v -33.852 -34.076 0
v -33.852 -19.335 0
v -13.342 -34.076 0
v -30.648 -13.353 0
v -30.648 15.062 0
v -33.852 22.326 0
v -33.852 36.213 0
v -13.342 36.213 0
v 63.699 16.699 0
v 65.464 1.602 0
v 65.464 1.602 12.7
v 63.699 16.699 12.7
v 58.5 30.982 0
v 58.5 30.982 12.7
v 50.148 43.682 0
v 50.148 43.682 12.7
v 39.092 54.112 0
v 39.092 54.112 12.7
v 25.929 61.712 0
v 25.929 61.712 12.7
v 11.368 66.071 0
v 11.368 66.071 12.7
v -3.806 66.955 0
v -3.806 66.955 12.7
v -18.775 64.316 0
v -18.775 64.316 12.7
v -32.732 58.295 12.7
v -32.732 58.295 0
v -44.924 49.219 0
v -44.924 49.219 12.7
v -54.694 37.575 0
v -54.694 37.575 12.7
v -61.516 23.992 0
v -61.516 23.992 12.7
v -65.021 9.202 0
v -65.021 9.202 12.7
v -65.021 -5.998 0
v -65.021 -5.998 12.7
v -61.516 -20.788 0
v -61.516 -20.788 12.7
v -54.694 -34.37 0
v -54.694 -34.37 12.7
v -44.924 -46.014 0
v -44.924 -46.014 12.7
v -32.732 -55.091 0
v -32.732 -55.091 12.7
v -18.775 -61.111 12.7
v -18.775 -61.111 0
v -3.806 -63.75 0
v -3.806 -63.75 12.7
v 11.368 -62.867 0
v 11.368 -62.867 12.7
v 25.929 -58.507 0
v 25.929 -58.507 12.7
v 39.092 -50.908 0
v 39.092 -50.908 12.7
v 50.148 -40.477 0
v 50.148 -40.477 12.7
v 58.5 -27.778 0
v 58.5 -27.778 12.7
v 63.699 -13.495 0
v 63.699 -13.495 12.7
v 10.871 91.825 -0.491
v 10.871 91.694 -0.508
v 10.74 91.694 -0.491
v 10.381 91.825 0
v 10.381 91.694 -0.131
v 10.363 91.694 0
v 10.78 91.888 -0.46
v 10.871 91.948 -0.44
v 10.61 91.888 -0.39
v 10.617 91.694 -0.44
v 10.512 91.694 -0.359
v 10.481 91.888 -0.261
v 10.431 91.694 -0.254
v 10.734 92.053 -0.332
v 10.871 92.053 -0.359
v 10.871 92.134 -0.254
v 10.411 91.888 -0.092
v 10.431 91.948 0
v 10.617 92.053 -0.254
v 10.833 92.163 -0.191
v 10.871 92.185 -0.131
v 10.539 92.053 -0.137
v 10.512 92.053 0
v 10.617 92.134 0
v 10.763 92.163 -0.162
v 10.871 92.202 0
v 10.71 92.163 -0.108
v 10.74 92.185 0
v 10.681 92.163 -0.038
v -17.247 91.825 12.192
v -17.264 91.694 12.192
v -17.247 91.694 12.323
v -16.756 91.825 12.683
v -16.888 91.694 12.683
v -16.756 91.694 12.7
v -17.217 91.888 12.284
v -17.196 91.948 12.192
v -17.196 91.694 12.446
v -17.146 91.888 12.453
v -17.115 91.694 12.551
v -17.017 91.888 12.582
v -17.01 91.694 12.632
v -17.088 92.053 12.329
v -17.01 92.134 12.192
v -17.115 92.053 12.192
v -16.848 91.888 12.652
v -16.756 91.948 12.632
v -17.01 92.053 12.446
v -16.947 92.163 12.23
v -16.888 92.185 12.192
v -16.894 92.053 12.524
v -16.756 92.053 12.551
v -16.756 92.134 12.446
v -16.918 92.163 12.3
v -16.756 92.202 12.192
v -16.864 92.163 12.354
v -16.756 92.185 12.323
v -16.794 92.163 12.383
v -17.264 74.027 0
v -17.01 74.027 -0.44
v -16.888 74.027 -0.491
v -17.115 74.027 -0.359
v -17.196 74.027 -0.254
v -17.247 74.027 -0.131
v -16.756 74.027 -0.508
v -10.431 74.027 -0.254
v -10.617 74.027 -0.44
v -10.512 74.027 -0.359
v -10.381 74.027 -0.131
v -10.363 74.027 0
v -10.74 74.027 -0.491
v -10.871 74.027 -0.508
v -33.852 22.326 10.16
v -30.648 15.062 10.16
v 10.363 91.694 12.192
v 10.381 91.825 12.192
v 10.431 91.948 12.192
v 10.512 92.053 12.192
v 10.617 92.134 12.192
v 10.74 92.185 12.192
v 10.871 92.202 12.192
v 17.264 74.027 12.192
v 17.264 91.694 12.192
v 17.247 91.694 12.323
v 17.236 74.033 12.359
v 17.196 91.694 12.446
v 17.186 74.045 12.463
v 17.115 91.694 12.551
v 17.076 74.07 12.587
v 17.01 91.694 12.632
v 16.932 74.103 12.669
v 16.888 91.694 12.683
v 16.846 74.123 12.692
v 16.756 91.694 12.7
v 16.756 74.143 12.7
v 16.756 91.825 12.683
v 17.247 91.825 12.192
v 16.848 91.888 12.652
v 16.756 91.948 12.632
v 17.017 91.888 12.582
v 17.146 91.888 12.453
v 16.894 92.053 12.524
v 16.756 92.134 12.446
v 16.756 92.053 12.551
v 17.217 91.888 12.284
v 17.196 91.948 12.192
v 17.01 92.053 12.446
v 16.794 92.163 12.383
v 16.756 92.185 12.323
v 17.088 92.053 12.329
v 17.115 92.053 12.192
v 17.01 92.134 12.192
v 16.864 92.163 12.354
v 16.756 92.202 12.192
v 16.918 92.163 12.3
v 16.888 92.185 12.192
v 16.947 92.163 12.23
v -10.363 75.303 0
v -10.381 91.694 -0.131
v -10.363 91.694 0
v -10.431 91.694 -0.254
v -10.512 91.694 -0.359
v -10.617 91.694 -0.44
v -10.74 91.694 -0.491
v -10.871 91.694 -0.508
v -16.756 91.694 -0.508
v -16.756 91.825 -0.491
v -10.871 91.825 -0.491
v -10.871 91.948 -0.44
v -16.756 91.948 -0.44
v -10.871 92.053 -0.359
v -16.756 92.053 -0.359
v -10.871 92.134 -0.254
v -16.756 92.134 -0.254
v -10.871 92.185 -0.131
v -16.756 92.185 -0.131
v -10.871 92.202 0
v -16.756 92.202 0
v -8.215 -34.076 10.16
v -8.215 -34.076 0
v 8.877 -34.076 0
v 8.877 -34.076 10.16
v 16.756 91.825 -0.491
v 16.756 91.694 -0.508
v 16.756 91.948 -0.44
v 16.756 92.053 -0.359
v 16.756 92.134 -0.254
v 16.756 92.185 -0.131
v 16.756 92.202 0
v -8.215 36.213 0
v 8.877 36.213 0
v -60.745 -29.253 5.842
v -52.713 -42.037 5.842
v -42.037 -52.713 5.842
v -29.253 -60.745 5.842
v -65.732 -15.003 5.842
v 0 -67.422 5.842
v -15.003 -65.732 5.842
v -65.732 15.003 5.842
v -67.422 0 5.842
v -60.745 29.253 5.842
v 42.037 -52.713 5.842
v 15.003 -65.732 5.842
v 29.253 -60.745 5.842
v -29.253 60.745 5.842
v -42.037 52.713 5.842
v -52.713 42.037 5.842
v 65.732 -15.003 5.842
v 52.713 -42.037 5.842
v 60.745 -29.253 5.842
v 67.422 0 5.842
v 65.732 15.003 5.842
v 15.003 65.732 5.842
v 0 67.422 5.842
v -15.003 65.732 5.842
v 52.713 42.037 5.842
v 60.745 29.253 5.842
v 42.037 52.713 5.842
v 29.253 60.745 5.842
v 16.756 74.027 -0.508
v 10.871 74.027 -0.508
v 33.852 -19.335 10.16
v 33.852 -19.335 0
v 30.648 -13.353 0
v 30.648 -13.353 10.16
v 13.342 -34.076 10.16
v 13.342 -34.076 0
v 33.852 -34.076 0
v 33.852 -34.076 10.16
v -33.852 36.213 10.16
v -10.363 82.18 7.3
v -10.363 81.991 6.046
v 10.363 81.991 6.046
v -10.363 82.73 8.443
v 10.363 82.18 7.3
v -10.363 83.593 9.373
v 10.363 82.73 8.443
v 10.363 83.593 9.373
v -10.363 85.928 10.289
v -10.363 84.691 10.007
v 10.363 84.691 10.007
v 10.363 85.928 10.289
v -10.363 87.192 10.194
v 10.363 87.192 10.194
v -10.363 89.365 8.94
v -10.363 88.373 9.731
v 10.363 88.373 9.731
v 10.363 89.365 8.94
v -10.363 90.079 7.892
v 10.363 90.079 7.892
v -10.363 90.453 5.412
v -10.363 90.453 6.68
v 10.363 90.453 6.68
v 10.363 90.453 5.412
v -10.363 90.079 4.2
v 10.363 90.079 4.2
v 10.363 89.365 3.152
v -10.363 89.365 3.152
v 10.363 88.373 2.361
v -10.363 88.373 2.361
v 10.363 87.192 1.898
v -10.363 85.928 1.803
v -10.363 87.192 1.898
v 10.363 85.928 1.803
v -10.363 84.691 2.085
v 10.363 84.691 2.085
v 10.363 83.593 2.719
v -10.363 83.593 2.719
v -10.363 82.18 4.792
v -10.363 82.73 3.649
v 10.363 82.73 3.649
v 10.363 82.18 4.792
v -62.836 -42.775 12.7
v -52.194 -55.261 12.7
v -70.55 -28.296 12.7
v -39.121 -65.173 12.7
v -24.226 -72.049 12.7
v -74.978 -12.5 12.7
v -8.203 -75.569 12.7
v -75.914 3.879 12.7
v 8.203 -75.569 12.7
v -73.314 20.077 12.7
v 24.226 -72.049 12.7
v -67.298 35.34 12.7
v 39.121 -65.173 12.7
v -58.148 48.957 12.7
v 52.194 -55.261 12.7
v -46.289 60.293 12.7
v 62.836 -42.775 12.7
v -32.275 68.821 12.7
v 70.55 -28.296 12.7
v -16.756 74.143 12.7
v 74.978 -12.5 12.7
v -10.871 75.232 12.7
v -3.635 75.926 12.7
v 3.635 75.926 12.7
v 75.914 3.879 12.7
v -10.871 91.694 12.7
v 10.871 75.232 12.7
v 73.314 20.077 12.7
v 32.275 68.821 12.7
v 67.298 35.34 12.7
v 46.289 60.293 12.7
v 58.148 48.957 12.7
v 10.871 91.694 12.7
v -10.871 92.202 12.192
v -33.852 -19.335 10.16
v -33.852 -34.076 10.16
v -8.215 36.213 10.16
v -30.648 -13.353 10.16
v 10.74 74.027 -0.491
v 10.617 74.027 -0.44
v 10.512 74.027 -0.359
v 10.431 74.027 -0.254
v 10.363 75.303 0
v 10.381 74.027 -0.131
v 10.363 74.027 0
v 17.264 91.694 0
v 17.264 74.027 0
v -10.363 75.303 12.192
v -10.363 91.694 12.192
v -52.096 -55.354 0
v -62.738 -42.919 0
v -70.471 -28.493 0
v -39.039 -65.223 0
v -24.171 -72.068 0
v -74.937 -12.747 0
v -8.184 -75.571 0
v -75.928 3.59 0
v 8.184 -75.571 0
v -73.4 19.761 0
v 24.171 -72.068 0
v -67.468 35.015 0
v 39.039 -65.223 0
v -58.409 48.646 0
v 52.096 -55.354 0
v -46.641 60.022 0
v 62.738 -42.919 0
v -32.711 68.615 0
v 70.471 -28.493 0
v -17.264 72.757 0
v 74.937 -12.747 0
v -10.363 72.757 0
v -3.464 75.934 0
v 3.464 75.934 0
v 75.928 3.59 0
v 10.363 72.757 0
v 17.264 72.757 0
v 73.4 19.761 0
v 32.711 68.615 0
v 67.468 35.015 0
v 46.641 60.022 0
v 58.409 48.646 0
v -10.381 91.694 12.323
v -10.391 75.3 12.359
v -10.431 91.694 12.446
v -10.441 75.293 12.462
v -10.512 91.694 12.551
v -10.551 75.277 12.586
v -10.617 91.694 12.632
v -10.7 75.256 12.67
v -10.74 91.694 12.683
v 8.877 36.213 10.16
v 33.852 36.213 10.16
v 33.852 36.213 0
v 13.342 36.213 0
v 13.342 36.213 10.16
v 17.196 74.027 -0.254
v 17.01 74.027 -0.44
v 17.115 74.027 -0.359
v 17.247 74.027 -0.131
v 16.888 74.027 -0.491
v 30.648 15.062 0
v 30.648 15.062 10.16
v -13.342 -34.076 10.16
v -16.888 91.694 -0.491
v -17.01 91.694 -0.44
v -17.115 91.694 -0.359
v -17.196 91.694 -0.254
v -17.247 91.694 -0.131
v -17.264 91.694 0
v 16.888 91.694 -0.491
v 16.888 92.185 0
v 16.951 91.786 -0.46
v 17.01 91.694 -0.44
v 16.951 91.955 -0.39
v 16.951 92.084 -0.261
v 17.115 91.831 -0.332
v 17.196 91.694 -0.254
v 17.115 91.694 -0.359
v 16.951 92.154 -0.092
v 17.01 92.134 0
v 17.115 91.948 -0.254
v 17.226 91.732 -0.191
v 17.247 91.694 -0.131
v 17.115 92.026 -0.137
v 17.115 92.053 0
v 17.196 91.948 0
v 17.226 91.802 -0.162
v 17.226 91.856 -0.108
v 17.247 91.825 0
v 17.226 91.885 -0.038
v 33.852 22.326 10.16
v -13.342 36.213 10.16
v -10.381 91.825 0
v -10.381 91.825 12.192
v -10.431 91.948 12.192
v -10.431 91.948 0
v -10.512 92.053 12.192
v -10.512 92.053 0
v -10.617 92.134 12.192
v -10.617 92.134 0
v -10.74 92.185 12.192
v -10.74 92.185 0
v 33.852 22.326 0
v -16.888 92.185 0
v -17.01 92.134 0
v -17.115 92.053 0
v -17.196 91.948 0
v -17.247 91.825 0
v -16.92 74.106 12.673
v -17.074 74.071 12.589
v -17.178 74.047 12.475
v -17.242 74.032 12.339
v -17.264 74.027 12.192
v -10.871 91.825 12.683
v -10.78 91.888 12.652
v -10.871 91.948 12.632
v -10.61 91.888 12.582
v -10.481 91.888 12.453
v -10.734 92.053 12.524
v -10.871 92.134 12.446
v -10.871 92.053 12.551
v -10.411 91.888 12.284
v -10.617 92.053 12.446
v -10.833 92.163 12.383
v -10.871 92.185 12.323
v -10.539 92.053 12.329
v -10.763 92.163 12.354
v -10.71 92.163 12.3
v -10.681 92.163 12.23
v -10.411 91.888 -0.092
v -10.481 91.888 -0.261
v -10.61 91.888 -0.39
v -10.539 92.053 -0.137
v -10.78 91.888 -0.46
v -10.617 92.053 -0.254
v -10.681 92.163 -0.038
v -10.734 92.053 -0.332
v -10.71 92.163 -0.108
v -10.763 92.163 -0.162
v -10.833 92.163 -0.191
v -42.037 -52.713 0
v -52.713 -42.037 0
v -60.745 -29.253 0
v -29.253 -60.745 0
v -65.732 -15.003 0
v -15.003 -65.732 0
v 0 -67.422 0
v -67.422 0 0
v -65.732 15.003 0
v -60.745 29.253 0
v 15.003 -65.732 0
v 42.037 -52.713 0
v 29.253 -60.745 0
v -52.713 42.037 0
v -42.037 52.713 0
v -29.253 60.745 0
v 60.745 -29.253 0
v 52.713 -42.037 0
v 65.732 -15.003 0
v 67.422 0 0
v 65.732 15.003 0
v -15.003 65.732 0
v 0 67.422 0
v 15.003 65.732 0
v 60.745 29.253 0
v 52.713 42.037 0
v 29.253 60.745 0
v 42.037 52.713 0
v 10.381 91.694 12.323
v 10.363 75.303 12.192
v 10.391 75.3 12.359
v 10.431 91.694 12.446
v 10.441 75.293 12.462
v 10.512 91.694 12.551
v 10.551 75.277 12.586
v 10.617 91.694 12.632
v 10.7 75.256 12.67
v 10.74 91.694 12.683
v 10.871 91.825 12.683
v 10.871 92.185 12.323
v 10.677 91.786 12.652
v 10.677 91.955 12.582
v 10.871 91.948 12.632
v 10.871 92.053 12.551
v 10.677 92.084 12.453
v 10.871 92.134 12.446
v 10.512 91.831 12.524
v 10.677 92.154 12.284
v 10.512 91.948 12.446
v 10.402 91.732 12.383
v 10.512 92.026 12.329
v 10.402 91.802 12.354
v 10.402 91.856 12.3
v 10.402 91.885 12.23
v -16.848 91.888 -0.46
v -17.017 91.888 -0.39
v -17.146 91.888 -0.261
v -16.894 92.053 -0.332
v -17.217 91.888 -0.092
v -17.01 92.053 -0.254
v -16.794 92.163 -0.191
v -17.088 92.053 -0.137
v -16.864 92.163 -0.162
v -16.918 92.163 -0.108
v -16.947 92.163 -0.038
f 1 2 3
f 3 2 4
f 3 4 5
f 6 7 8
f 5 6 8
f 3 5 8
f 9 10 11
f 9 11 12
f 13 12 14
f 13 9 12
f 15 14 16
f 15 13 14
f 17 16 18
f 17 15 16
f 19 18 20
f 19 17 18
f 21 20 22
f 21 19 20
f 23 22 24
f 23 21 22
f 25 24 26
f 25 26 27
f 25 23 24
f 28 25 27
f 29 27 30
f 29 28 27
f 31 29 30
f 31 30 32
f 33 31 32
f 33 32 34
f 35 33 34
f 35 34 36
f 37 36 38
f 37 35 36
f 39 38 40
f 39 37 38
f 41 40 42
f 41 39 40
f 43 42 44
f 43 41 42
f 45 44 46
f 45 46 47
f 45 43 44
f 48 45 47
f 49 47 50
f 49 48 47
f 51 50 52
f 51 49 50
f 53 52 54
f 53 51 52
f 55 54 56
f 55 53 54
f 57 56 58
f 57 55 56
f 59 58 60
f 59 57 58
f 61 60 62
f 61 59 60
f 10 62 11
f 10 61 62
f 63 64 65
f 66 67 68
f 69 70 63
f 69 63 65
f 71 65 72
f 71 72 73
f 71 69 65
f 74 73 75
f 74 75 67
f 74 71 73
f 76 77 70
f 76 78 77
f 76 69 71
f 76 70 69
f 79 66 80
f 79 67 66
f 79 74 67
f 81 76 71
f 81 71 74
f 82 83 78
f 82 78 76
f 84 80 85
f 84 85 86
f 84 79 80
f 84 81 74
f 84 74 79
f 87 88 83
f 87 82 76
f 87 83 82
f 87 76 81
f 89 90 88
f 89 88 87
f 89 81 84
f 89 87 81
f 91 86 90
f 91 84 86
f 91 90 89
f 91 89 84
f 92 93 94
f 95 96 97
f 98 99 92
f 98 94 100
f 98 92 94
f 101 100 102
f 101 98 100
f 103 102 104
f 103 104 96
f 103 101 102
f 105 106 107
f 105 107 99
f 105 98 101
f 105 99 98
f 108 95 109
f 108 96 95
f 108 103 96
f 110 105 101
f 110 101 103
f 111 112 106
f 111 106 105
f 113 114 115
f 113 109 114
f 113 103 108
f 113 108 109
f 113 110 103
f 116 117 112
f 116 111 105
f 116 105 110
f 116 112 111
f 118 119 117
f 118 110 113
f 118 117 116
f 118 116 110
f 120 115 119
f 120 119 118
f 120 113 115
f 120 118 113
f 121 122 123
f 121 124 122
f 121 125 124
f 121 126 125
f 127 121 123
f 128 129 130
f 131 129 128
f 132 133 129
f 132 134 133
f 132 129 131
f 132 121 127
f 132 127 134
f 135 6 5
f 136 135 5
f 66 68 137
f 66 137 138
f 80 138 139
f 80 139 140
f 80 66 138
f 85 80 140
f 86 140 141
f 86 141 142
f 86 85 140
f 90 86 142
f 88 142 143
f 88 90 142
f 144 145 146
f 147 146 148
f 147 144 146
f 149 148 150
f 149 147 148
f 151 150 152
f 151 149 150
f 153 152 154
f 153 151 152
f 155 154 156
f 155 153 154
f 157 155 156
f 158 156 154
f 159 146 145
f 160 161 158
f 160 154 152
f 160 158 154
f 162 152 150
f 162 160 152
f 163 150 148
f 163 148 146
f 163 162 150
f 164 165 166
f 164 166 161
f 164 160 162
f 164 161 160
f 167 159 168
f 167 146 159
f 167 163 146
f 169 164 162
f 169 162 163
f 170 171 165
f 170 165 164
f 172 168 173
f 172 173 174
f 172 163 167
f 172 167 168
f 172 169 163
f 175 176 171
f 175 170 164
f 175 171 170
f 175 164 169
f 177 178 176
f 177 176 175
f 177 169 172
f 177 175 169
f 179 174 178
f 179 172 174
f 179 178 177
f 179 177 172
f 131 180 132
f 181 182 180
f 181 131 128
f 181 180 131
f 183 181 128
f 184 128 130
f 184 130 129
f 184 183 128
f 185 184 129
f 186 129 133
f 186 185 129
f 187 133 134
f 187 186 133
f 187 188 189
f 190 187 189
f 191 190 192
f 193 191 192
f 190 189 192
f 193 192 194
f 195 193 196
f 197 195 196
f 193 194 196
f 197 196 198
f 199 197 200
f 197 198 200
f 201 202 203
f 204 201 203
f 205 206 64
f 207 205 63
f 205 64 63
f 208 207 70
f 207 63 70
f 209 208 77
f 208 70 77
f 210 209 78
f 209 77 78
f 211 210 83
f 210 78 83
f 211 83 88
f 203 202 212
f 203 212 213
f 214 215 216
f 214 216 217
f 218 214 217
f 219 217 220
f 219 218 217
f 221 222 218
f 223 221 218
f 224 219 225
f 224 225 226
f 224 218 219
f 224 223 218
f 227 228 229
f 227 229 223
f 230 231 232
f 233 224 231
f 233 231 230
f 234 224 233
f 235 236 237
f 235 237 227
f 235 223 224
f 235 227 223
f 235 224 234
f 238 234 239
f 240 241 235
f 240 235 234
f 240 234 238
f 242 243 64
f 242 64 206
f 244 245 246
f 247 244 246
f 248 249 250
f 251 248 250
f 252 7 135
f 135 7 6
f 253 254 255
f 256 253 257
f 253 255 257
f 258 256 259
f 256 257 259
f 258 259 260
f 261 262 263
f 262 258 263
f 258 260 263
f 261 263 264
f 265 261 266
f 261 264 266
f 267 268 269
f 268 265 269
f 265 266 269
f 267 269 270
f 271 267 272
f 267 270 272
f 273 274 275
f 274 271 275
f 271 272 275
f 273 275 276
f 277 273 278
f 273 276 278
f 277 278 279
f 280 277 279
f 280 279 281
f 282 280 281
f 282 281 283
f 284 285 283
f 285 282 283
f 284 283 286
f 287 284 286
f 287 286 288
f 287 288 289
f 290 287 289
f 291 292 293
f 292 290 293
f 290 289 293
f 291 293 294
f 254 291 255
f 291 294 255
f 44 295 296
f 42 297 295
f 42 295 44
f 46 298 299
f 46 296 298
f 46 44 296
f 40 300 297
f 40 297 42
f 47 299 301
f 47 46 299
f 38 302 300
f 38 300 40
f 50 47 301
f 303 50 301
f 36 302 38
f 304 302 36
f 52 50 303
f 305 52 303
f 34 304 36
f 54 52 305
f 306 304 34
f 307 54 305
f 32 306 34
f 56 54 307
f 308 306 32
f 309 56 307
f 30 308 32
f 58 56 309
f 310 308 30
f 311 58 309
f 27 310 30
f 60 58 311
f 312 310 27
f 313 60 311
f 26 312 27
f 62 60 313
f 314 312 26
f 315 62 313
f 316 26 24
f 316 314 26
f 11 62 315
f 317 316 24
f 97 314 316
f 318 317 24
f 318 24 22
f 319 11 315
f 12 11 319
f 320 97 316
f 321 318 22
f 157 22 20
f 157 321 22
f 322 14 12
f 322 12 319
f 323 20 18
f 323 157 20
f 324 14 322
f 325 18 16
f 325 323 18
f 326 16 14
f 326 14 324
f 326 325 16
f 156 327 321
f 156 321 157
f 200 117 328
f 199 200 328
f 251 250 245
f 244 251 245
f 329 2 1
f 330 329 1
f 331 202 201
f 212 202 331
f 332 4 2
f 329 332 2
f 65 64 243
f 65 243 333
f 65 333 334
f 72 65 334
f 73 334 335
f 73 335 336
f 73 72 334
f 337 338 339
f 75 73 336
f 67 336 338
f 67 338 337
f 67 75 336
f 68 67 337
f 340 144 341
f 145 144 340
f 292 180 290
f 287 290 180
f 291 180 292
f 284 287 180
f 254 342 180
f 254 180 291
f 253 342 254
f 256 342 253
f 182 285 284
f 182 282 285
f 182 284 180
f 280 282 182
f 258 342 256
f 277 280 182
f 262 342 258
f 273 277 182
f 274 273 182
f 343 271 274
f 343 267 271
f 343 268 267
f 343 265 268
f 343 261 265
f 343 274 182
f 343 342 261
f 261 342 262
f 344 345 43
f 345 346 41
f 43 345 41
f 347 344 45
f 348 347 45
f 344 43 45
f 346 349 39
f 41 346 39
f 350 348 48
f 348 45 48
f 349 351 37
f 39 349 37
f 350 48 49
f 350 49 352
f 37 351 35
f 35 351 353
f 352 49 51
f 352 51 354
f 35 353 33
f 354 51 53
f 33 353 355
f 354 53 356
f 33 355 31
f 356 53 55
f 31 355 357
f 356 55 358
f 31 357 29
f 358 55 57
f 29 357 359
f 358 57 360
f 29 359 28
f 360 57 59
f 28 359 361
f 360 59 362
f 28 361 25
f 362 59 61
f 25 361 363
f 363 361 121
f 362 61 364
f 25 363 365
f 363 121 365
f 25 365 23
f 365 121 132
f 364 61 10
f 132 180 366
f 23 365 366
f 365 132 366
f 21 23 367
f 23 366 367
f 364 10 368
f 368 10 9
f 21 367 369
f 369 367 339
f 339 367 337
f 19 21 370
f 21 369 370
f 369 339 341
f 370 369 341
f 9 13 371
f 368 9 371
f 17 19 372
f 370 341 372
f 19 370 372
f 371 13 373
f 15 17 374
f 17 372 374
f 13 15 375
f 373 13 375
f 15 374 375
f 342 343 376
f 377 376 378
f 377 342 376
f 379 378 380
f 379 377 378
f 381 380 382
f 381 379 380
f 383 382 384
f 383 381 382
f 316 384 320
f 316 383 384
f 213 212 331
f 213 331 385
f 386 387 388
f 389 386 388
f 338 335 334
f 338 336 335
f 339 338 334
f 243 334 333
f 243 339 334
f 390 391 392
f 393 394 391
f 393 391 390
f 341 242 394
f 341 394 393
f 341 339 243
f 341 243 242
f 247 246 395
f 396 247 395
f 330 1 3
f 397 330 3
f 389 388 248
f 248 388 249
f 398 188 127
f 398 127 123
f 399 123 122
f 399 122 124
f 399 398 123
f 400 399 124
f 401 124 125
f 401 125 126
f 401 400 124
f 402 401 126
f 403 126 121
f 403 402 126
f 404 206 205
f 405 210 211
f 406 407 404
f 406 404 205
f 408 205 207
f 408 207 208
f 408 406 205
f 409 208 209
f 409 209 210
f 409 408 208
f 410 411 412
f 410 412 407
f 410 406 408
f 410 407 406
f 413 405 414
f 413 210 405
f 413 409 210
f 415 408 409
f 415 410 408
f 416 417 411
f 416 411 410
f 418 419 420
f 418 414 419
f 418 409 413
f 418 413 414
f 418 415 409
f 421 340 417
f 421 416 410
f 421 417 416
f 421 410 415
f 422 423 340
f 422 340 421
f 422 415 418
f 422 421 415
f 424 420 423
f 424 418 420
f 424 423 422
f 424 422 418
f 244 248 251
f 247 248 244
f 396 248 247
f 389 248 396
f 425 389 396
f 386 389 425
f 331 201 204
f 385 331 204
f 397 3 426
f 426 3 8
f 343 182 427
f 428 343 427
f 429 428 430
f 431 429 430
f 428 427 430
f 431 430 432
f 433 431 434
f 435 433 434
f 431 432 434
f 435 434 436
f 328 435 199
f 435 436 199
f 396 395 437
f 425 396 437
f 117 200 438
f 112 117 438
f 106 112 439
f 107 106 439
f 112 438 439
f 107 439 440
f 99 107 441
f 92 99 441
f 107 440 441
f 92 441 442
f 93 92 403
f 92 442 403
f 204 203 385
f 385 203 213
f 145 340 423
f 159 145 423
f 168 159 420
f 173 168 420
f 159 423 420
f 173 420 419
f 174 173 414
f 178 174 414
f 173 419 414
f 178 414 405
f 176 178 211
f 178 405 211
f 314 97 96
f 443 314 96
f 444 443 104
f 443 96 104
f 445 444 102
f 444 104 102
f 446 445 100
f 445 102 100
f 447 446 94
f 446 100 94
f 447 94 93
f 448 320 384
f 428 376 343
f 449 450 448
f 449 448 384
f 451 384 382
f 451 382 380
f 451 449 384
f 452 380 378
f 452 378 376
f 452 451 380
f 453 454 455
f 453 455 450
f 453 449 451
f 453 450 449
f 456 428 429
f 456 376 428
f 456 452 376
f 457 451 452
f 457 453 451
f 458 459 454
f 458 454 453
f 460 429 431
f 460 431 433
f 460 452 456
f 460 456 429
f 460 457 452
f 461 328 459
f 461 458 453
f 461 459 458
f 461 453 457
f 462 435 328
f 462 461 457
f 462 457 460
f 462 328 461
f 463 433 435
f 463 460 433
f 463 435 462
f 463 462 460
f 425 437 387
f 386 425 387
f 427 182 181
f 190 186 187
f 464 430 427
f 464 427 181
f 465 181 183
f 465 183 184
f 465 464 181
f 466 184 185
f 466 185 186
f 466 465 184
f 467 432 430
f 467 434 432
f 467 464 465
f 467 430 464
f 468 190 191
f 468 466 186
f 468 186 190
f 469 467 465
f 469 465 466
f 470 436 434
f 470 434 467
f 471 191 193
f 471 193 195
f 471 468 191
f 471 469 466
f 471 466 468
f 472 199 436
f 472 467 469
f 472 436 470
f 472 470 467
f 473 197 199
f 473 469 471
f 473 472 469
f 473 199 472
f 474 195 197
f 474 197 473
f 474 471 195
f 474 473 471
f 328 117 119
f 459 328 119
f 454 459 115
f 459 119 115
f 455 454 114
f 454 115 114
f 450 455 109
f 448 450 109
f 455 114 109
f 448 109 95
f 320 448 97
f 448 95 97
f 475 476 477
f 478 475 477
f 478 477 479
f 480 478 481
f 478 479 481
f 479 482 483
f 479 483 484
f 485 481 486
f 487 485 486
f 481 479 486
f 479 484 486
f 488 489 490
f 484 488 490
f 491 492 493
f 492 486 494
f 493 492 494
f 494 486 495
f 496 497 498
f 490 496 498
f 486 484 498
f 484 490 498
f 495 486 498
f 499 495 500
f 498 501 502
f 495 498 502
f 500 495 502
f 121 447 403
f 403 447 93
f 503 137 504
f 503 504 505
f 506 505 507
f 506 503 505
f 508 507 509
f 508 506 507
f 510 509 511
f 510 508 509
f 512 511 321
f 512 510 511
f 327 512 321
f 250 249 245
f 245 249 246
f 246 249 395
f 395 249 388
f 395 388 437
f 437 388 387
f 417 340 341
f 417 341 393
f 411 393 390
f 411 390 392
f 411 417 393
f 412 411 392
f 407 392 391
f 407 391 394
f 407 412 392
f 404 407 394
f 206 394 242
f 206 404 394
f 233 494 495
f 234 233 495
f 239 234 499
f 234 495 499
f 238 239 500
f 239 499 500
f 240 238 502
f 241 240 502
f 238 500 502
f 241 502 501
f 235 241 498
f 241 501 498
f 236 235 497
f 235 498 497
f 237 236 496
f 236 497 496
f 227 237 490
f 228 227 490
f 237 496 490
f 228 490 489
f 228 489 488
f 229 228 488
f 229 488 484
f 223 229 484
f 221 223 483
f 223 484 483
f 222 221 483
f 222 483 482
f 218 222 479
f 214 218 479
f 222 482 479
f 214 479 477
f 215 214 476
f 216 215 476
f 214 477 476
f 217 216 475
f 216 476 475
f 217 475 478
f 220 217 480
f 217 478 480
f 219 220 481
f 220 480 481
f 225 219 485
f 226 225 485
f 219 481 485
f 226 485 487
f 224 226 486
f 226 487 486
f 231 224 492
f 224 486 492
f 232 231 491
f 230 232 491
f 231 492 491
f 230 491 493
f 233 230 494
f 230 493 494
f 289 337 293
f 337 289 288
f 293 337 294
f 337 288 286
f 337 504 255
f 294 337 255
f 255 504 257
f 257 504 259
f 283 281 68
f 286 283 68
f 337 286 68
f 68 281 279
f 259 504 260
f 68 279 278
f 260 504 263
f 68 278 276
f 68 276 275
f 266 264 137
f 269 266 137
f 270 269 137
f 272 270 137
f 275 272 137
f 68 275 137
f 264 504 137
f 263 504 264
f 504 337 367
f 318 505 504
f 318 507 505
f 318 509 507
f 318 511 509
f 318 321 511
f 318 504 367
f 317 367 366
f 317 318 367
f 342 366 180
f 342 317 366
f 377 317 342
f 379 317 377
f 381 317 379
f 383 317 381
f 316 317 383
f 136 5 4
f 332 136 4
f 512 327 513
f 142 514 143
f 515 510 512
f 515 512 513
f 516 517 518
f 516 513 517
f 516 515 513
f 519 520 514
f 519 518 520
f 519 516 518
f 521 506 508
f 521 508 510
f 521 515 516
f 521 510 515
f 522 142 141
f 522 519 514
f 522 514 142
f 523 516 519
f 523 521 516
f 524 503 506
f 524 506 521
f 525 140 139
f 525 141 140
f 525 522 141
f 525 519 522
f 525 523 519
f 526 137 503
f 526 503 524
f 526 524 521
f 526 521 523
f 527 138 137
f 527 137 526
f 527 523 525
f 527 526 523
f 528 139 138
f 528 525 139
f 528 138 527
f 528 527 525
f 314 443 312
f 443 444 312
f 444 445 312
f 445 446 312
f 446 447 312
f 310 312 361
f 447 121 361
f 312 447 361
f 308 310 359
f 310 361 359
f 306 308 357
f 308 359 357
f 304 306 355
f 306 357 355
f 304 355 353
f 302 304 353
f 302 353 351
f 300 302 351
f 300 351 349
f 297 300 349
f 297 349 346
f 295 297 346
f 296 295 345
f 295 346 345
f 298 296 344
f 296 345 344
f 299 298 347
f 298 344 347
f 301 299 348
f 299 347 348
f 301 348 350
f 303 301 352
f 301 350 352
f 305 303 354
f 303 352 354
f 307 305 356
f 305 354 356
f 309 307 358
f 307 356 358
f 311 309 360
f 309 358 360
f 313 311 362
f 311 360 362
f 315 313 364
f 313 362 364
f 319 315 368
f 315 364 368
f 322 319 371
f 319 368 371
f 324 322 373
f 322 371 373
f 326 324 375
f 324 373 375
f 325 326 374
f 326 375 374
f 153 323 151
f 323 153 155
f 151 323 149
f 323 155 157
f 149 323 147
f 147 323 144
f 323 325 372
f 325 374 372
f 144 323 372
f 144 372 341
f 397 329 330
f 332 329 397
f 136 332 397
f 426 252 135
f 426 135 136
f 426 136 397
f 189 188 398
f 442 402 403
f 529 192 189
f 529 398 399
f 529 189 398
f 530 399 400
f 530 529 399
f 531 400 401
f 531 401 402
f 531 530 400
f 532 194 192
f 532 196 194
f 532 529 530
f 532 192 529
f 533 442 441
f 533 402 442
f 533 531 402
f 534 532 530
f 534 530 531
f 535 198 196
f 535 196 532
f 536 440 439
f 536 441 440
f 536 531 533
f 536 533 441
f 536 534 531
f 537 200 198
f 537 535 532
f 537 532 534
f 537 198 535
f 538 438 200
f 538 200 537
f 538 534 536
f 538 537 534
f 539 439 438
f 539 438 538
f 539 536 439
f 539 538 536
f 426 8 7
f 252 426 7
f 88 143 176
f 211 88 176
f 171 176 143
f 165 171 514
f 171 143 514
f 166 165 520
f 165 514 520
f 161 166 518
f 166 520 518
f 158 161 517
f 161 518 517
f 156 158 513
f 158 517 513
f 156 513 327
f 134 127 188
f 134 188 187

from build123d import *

# Parameters (mm, degrees)
F0_R         = 76.0132265617
F0_R_2       = 65.4635898971
F1_DEPTH     = 12.7
F2_DEPTH     = 10.16
F0_W         = 17.0915899798
F0_H         = 70.289157331
F3_R         = 67.422384844
F4_DEPTH     = 5.842
F5_W         = 6.9010015448
F5_H         = 18.1752619196
F6_DEPTH     = 13.208
F7_T1_DEPTH  = 5.8850015448
F7_T3_DEPTH  = 5.8850015448
F7_T5_DEPTH  = 12.192
F7_T7_DEPTH  = 18.9372619196
F7_S11_W     = 0.508
F7_S11_H     = 0.508
F7_T12_DEPTH = 0.508
F7_S17_W     = 0.508
F7_S17_H     = 0.508
F7_T18_DEPTH = 0.508
F7_S23_W     = 0.508
F7_S23_H     = 0.508
F7_T24_DEPTH = 0.508
F7_S29_W     = 0.508
F7_S29_H     = 0.508
F7_T30_DEPTH = 0.508
F7_S35_W     = 0.508
F7_S35_H     = 0.508
F7_T36_DEPTH = 0.508
F7_S41_W     = 0.508
F7_S41_H     = 0.508
F7_T42_DEPTH = 0.508
F7_S47_W     = 0.508
F7_S47_H     = 0.508
F7_T48_DEPTH = 0.508
F7_S53_W     = 0.508
F7_S53_H     = 0.508
F7_T54_DEPTH = 0.508
F7_T60_DEPTH = 17.6605161867
F7_S61_R     = 76.0132265617
F7_T62_DEPTH = 10
F7_T66_DEPTH = 18.9372619196
F7_S67_R     = 76.0132265617
F7_T68_DEPTH = 11
F7_T72_DEPTH = 17.6605161867
F7_S73_R     = 76.0132265617
F7_T74_DEPTH = 10
F7_T78_DEPTH = 18.9372619196
F7_S79_R     = 76.0132265617
F7_T80_DEPTH = 11
F8_R         = 4.2547927507
F9_DEPTH     = 25.4


# Not quite as in the source:
# - a fillet or chamfer that OpenCascade refuses, or shapes differently, is made with other operations: its cross-section is extruded or revolved along the edge and cut away or added


with BuildPart() as f1:
    # F0 (on Top) → F1 (new body)
    with BuildSketch(Plane.XY):
        Circle(F0_R)
        with Locations((0, 1.6023365315)):
            Circle(F0_R_2, mode=Mode.SUBTRACT)
    extrude(amount=F1_DEPTH)

    # F5 (on face) → F6 (join)
    with BuildSketch(Plane.XY.offset(12.7)):
        with Locations((-13.8136995892, 83.1143693602)):
            Rectangle(F5_W, F5_H)
        with Locations((13.8136995892, 83.1143693602)):
            Rectangle(F5_W, F5_H)
    extrude(amount=-F6_DEPTH)

    # F7: fillet of radius 0.508 on 16 edges, made by hand

    # F7_s2 → F7_t1 (cut)
    with BuildSketch(Plane.YZ.offset(-16.7562003616)):
        with BuildLine():
            ThreePointArc((92.20200032, 12.192), (92.0532105648, 12.5512102448), (91.69400032, 12.7))
            Line((91.69400032, 12.7), (92.20200032, 12.7))
            Line((92.20200032, 12.7), (92.20200032, 12.192))
        make_face()
        with BuildLine():
            ThreePointArc((91.69400032, -0.508), (92.0532105648, -0.3592102448), (92.20200032, 0))
            Line((92.20200032, 0), (92.20200032, -0.508))
            Line((92.20200032, -0.508), (91.69400032, -0.508))
        make_face()
    extrude(amount=F7_T1_DEPTH, mode=Mode.SUBTRACT)

    # F7_s4 → F7_t3 (cut)
    with BuildSketch(Plane.YZ.offset(10.8711988168)):
        with BuildLine():
            ThreePointArc((92.20200032, 12.192), (92.0532105648, 12.5512102448), (91.69400032, 12.7))
            Line((91.69400032, 12.7), (92.20200032, 12.7))
            Line((92.20200032, 12.7), (92.20200032, 12.192))
        make_face()
        with BuildLine():
            ThreePointArc((91.69400032, -0.508), (92.0532105648, -0.3592102448), (92.20200032, 0))
            Line((92.20200032, 0), (92.20200032, -0.508))
            Line((92.20200032, -0.508), (91.69400032, -0.508))
        make_face()
    extrude(amount=F7_T3_DEPTH, mode=Mode.SUBTRACT)

    # F7_s6 → F7_t5 (cut)
    with BuildSketch(Plane.XY):
        with BuildLine():
            ThreePointArc((17.2642003616, 91.69400032), (17.1154106065, 92.0532105648), (16.7562003616, 92.20200032))
            Line((16.7562003616, 92.20200032), (17.2642003616, 92.20200032))
            Line((17.2642003616, 92.20200032), (17.2642003616, 91.69400032))
        make_face()
        with BuildLine():
            ThreePointArc((10.3631988168, 91.69400032), (10.5119885719, 92.0532105648), (10.8711988168, 92.20200032))
            Line((10.8711988168, 92.20200032), (10.3631988168, 92.20200032))
            Line((10.3631988168, 92.20200032), (10.3631988168, 91.69400032))
        make_face()
        with BuildLine():
            ThreePointArc((-16.7562003616, 92.20200032), (-17.1154106065, 92.0532105648), (-17.2642003616, 91.69400032))
            Line((-17.2642003616, 91.69400032), (-17.2642003616, 92.20200032))
            Line((-17.2642003616, 92.20200032), (-16.7562003616, 92.20200032))
        make_face()
        with BuildLine():
            ThreePointArc((-10.3631988168, 91.69400032), (-10.5119885719, 92.0532105648), (-10.8711988168, 92.20200032))
            Line((-10.8711988168, 92.20200032), (-10.3631988168, 92.20200032))
            Line((-10.3631988168, 92.20200032), (-10.3631988168, 91.69400032))
        make_face()
    extrude(amount=F7_T5_DEPTH, mode=Mode.SUBTRACT)

    # F7_s8 → F7_t7 (cut)
    with BuildSketch(Plane.XZ.offset(-91.69400032)):
        with BuildLine():
            ThreePointArc((10.8711988168, -0.508), (10.5119885719, -0.3592102448), (10.3631988168, 0))
            Line((10.3631988168, 0), (10.3631988168, -0.508))
            Line((10.3631988168, -0.508), (10.8711988168, -0.508))
        make_face()
        with BuildLine():
            ThreePointArc((-16.7562003616, -0.508), (-17.1154106065, -0.3592102448), (-17.2642003616, 0))
            Line((-17.2642003616, 0), (-17.2642003616, -0.508))
            Line((-17.2642003616, -0.508), (-16.7562003616, -0.508))
        make_face()
        with BuildLine():
            ThreePointArc((17.2642003616, 0), (17.1154106065, -0.3592102448), (16.7562003616, -0.508))
            Line((16.7562003616, -0.508), (17.2642003616, -0.508))
            Line((17.2642003616, -0.508), (17.2642003616, 0))
        make_face()
        with BuildLine():
            ThreePointArc((-10.3631988168, 0), (-10.5119885719, -0.3592102448), (-10.8711988168, -0.508))
            Line((-10.8711988168, -0.508), (-10.3631988168, -0.508))
            Line((-10.3631988168, -0.508), (-10.3631988168, 0))
        make_face()
    extrude(amount=F7_T7_DEPTH, mode=Mode.SUBTRACT)


with BuildPart() as f2:
    # F0 (on Top) → F2 (new body)
    with BuildSketch(Plane.XY):
        Polygon((-13.3424317464, -34.0763553977), (-13.3424317464, 36.2128019333), (-33.8523387909, 36.2128019333), (-33.8523387909, 22.3258882761), (-30.6476652622, 15.0619633496), (-30.6476652622, -13.3528038859), (-33.8523387909, -19.334860146), (-33.8523387909, -34.0763553977), align=None)
    extrude(amount=F2_DEPTH)


with BuildPart() as f2b:
    # F0 (on Top) → F2, piece 2 (new body)
    with BuildSketch(Plane.XY):
        with Locations((0.3308397718, 1.0682232678)):
            Rectangle(F0_W, F0_H)
    extrude(amount=F2_DEPTH)


with BuildPart() as f2c:
    # F0 (on Top) → F2, piece 3 (new body)
    with BuildSketch(Plane.XY):
        Polygon((33.8523387909, 36.2128019333), (13.3424317464, 36.2128019333), (13.3424317464, -34.0763553977), (33.8523387909, -34.0763553977), (33.8523387909, -19.334860146), (30.6476652622, -13.3528038859), (30.6476652622, 15.0619633496), (33.8523387909, 22.3258882761), align=None)
    extrude(amount=F2_DEPTH)


with BuildPart() as f4:
    # F3 (on Top) → F4 (new body)
    with BuildSketch(Plane.XY):
        Circle(F3_R)
    extrude(amount=F4_DEPTH)


with BuildPart() as f7_tool10:
    # F7_s11 → F7_t12 (new body)
    with BuildSketch(Plane.XZ.offset(-91.69400032)):
        with Locations((-10.6171988168, 12.446)):
            Rectangle(F7_S11_W, F7_S11_H)
    extrude(amount=-F7_T12_DEPTH)

    # F7_s13 → F7_t14 (revolve, cut)
    with BuildSketch(Plane(origin=(-10.8711988168, 91.69400032, 12.192), x_dir=(-0.7071067812, 0, -0.7071067812), z_dir=(0.7071067812, 0, -0.7071067812))):
        with BuildLine():
            ThreePointArc((0, -0.508), (0.508, 0), (0, 0.508))
            Line((0, 0.508), (0, -0.508))
        make_face()
    revolve(axis=Axis((-10.8711988168, 91.69400032, 12.192), (0, 1, 0)), mode=Mode.SUBTRACT)


with BuildPart() as f1_1:
    add(f1.part)

    # F7_t9: cut F7_tool10
    add(f7_tool10.part, mode=Mode.SUBTRACT)


with BuildPart() as f7_tool16:
    # F7_s17 → F7_t18 (new body)
    with BuildSketch(Plane.XZ.offset(-91.69400032)):
        with Locations((-17.0102003616, 12.446)):
            Rectangle(F7_S17_W, F7_S17_H)
    extrude(amount=-F7_T18_DEPTH)

    # F7_s19 → F7_t20 (revolve, cut)
    with BuildSketch(Plane(origin=(-16.7562003616, 91.69400032, 12.192), x_dir=(0.7071067812, 0, -0.7071067812), z_dir=(0.7071067812, 0, 0.7071067812))):
        with BuildLine():
            ThreePointArc((0, -0.508), (0.508, 0), (0, 0.508))
            Line((0, 0.508), (0, -0.508))
        make_face()
    revolve(axis=Axis((-16.7562003616, 91.69400032, 12.192), (0, 1, 0)), mode=Mode.SUBTRACT)


with BuildPart() as f1_2:
    add(f1_1.part)

    # F7_t15: cut F7_tool16
    add(f7_tool16.part, mode=Mode.SUBTRACT)


with BuildPart() as f7_tool22:
    # F7_s23 → F7_t24 (new body)
    with BuildSketch(Plane.XZ.offset(-91.69400032)):
        with Locations((17.0102003616, 12.446)):
            Rectangle(F7_S23_W, F7_S23_H)
    extrude(amount=-F7_T24_DEPTH)

    # F7_s25 → F7_t26 (revolve, cut)
    with BuildSketch(Plane(origin=(16.7562003616, 91.69400032, 12.192), x_dir=(-0.7071067812, 0, -0.7071067812), z_dir=(0.7071067812, 0, -0.7071067812))):
        with BuildLine():
            ThreePointArc((0, -0.508), (0.508, 0), (0, 0.508))
            Line((0, 0.508), (0, -0.508))
        make_face()
    revolve(axis=Axis((16.7562003616, 91.69400032, 12.192), (0, 1, 0)), mode=Mode.SUBTRACT)


with BuildPart() as f1_3:
    add(f1_2.part)

    # F7_t21: cut F7_tool22
    add(f7_tool22.part, mode=Mode.SUBTRACT)


with BuildPart() as f7_tool28:
    # F7_s29 → F7_t30 (new body)
    with BuildSketch(Plane.YZ.offset(10.8711988168)):
        with Locations((91.94800032, 12.446)):
            Rectangle(F7_S29_W, F7_S29_H)
    extrude(amount=-F7_T30_DEPTH)

    # F7_s31 → F7_t32 (revolve, cut)
    with BuildSketch(Plane(origin=(10.8711988168, 91.69400032, 12.192), x_dir=(0, -0.7071067812, -0.7071067812), z_dir=(0, 0.7071067812, -0.7071067812))):
        with BuildLine():
            ThreePointArc((0, -0.508), (0.508, 0), (0, 0.508))
            Line((0, 0.508), (0, -0.508))
        make_face()
    revolve(axis=Axis((10.8711988168, 91.69400032, 12.192), (-1, 0, 0)), mode=Mode.SUBTRACT)


with BuildPart() as f1_4:
    add(f1_3.part)

    # F7_t27: cut F7_tool28
    add(f7_tool28.part, mode=Mode.SUBTRACT)


with BuildPart() as f7_tool34:
    # F7_s35 → F7_t36 (new body)
    with BuildSketch(Plane.YZ.offset(16.7562003616)):
        with Locations((91.94800032, -0.254)):
            Rectangle(F7_S35_W, F7_S35_H)
    extrude(amount=F7_T36_DEPTH)

    # F7_s37 → F7_t38 (revolve, cut)
    with BuildSketch(Plane(origin=(16.7562003616, 91.69400032, 0), x_dir=(0, -0.7071067812, 0.7071067812), z_dir=(0, 0.7071067812, 0.7071067812))):
        with BuildLine():
            ThreePointArc((0, -0.508), (0.508, 0), (0, 0.508))
            Line((0, 0.508), (0, -0.508))
        make_face()
    revolve(axis=Axis((16.7562003616, 91.69400032, 0), (1, 0, 0)), mode=Mode.SUBTRACT)


with BuildPart() as f1_5:
    add(f1_4.part)

    # F7_t33: cut F7_tool34
    add(f7_tool34.part, mode=Mode.SUBTRACT)


with BuildPart() as f7_tool40:
    # F7_s41 → F7_t42 (new body)
    with BuildSketch(Plane.XZ.offset(-91.69400032)):
        with Locations((10.6171988168, -0.254)):
            Rectangle(F7_S41_W, F7_S41_H)
    extrude(amount=-F7_T42_DEPTH)

    # F7_s43 → F7_t44 (revolve, cut)
    with BuildSketch(Plane(origin=(10.8711988168, 91.69400032, 0), x_dir=(0.7071067812, 0, 0.7071067812), z_dir=(-0.7071067812, 0, 0.7071067812))):
        with BuildLine():
            ThreePointArc((0, -0.508), (0.508, 0), (0, 0.508))
            Line((0, 0.508), (0, -0.508))
        make_face()
    revolve(axis=Axis((10.8711988168, 91.69400032, 0), (0, 1, 0)), mode=Mode.SUBTRACT)


with BuildPart() as f1_6:
    add(f1_5.part)

    # F7_t39: cut F7_tool40
    add(f7_tool40.part, mode=Mode.SUBTRACT)


with BuildPart() as f7_tool46:
    # F7_s47 → F7_t48 (new body)
    with BuildSketch(Plane.XZ.offset(-91.69400032)):
        with Locations((-17.0102003616, -0.254)):
            Rectangle(F7_S47_W, F7_S47_H)
    extrude(amount=-F7_T48_DEPTH)

    # F7_s49 → F7_t50 (revolve, cut)
    with BuildSketch(Plane(origin=(-16.7562003616, 91.69400032, 0), x_dir=(0.7071067812, 0, 0.7071067812), z_dir=(-0.7071067812, 0, 0.7071067812))):
        with BuildLine():
            ThreePointArc((0, -0.508), (0.508, 0), (0, 0.508))
            Line((0, 0.508), (0, -0.508))
        make_face()
    revolve(axis=Axis((-16.7562003616, 91.69400032, 0), (0, 1, 0)), mode=Mode.SUBTRACT)


with BuildPart() as f1_7:
    add(f1_6.part)

    # F7_t45: cut F7_tool46
    add(f7_tool46.part, mode=Mode.SUBTRACT)


with BuildPart() as f7_tool52:
    # F7_s53 → F7_t54 (new body)
    with BuildSketch(Plane.XZ.offset(-91.69400032)):
        with Locations((-10.6171988168, -0.254)):
            Rectangle(F7_S53_W, F7_S53_H)
    extrude(amount=-F7_T54_DEPTH)

    # F7_s55 → F7_t56 (revolve, cut)
    with BuildSketch(Plane(origin=(-10.8711988168, 91.69400032, 0), x_dir=(-0.7071067812, 0, 0.7071067812), z_dir=(-0.7071067812, 0, -0.7071067812))):
        with BuildLine():
            ThreePointArc((0, -0.508), (0.508, 0), (0, 0.508))
            Line((0, 0.508), (0, -0.508))
        make_face()
    revolve(axis=Axis((-10.8711988168, 91.69400032, 0), (0, 1, 0)), mode=Mode.SUBTRACT)


with BuildPart() as f1_8:
    add(f1_7.part)

    # F7_t51: cut F7_tool52
    add(f7_tool52.part, mode=Mode.SUBTRACT)


with BuildPart() as f7_tool58:
    # F7_s59 → F7_t60 (new body)
    with BuildSketch(Plane.XZ.offset(-91.69400032)):
        with BuildLine():
            ThreePointArc((10.3631988168, 12.192), (10.5119885719, 12.5512102448), (10.8711988168, 12.7))
            Line((10.8711988168, 12.7), (10.3631988168, 12.7))
            Line((10.3631988168, 12.7), (10.3631988168, 12.192))
        make_face()
    extrude(amount=F7_T60_DEPTH)

    # F7_s61 → F7_t62 (cut, symmetric)
    with BuildSketch(Plane.XY.offset(12.4)):
        Circle(F7_S61_R)
    extrude(amount=F7_T62_DEPTH, both=True, mode=Mode.SUBTRACT)


with BuildPart() as f1_9:
    add(f1_8.part)

    # F7_t57: cut F7_tool58
    add(f7_tool58.part, mode=Mode.SUBTRACT)


with BuildPart() as f7_tool64:
    # F7_s65 → F7_t66 (new body)
    with BuildSketch(Plane.XZ.offset(-72.7567384004)):
        with BuildLine():
            ThreePointArc((17.2642003616, 12.192), (17.1154106065, 12.5512102448), (16.7562003616, 12.7))
            Line((16.7562003616, 12.7), (17.2642003616, 12.7))
            Line((17.2642003616, 12.7), (17.2642003616, 12.192))
        make_face()
    extrude(amount=-F7_T66_DEPTH)

    # F7_s67 → F7_t68 (cut, symmetric)
    with BuildSketch(Plane.XY.offset(12.4)):
        Circle(F7_S67_R)
    extrude(amount=F7_T68_DEPTH, both=True, mode=Mode.SUBTRACT)


with BuildPart() as f1_10:
    add(f1_9.part)

    # F7_t63: cut F7_tool64
    add(f7_tool64.part, mode=Mode.SUBTRACT)


with BuildPart() as f7_tool70:
    # F7_s71 → F7_t72 (new body)
    with BuildSketch(Plane.XZ.offset(-74.0334841333)):
        with BuildLine():
            ThreePointArc((-10.3631988168, 12.192), (-10.5119885719, 12.5512102448), (-10.8711988168, 12.7))
            Line((-10.8711988168, 12.7), (-10.3631988168, 12.7))
            Line((-10.3631988168, 12.7), (-10.3631988168, 12.192))
        make_face()
    extrude(amount=-F7_T72_DEPTH)

    # F7_s73 → F7_t74 (cut, symmetric)
    with BuildSketch(Plane.XY.offset(12.4)):
        Circle(F7_S73_R)
    extrude(amount=F7_T74_DEPTH, both=True, mode=Mode.SUBTRACT)


with BuildPart() as f1_11:
    add(f1_10.part)

    # F7_t69: cut F7_tool70
    add(f7_tool70.part, mode=Mode.SUBTRACT)


with BuildPart() as f7_tool76:
    # F7_s77 → F7_t78 (new body)
    with BuildSketch(Plane.XZ.offset(-91.69400032)):
        with BuildLine():
            ThreePointArc((-16.7562003616, 12.7), (-17.1154106065, 12.5512102448), (-17.2642003616, 12.192))
            Line((-17.2642003616, 12.192), (-17.2642003616, 12.7))
            Line((-17.2642003616, 12.7), (-16.7562003616, 12.7))
        make_face()
    extrude(amount=F7_T78_DEPTH)

    # F7_s79 → F7_t80 (cut, symmetric)
    with BuildSketch(Plane.XY.offset(12.4)):
        Circle(F7_S79_R)
    extrude(amount=F7_T80_DEPTH, both=True, mode=Mode.SUBTRACT)


with BuildPart() as f1_12:
    add(f1_11.part)

    # F7_t75: cut F7_tool76
    add(f7_tool76.part, mode=Mode.SUBTRACT)

    # F8 (on face) → F9 (join)
    with BuildSketch(Plane(origin=(10.3631988168, 0, 0), x_dir=(0, -1, 0), z_dir=(-1, 0, 0))):
        with Locations((-86.2456560135, 6.0460111126)):
            Circle(F8_R)
    extrude(amount=F9_DEPTH)


solid = Compound([f2.part, f2b.part, f2c.part, f4.part, f1_12.part])
